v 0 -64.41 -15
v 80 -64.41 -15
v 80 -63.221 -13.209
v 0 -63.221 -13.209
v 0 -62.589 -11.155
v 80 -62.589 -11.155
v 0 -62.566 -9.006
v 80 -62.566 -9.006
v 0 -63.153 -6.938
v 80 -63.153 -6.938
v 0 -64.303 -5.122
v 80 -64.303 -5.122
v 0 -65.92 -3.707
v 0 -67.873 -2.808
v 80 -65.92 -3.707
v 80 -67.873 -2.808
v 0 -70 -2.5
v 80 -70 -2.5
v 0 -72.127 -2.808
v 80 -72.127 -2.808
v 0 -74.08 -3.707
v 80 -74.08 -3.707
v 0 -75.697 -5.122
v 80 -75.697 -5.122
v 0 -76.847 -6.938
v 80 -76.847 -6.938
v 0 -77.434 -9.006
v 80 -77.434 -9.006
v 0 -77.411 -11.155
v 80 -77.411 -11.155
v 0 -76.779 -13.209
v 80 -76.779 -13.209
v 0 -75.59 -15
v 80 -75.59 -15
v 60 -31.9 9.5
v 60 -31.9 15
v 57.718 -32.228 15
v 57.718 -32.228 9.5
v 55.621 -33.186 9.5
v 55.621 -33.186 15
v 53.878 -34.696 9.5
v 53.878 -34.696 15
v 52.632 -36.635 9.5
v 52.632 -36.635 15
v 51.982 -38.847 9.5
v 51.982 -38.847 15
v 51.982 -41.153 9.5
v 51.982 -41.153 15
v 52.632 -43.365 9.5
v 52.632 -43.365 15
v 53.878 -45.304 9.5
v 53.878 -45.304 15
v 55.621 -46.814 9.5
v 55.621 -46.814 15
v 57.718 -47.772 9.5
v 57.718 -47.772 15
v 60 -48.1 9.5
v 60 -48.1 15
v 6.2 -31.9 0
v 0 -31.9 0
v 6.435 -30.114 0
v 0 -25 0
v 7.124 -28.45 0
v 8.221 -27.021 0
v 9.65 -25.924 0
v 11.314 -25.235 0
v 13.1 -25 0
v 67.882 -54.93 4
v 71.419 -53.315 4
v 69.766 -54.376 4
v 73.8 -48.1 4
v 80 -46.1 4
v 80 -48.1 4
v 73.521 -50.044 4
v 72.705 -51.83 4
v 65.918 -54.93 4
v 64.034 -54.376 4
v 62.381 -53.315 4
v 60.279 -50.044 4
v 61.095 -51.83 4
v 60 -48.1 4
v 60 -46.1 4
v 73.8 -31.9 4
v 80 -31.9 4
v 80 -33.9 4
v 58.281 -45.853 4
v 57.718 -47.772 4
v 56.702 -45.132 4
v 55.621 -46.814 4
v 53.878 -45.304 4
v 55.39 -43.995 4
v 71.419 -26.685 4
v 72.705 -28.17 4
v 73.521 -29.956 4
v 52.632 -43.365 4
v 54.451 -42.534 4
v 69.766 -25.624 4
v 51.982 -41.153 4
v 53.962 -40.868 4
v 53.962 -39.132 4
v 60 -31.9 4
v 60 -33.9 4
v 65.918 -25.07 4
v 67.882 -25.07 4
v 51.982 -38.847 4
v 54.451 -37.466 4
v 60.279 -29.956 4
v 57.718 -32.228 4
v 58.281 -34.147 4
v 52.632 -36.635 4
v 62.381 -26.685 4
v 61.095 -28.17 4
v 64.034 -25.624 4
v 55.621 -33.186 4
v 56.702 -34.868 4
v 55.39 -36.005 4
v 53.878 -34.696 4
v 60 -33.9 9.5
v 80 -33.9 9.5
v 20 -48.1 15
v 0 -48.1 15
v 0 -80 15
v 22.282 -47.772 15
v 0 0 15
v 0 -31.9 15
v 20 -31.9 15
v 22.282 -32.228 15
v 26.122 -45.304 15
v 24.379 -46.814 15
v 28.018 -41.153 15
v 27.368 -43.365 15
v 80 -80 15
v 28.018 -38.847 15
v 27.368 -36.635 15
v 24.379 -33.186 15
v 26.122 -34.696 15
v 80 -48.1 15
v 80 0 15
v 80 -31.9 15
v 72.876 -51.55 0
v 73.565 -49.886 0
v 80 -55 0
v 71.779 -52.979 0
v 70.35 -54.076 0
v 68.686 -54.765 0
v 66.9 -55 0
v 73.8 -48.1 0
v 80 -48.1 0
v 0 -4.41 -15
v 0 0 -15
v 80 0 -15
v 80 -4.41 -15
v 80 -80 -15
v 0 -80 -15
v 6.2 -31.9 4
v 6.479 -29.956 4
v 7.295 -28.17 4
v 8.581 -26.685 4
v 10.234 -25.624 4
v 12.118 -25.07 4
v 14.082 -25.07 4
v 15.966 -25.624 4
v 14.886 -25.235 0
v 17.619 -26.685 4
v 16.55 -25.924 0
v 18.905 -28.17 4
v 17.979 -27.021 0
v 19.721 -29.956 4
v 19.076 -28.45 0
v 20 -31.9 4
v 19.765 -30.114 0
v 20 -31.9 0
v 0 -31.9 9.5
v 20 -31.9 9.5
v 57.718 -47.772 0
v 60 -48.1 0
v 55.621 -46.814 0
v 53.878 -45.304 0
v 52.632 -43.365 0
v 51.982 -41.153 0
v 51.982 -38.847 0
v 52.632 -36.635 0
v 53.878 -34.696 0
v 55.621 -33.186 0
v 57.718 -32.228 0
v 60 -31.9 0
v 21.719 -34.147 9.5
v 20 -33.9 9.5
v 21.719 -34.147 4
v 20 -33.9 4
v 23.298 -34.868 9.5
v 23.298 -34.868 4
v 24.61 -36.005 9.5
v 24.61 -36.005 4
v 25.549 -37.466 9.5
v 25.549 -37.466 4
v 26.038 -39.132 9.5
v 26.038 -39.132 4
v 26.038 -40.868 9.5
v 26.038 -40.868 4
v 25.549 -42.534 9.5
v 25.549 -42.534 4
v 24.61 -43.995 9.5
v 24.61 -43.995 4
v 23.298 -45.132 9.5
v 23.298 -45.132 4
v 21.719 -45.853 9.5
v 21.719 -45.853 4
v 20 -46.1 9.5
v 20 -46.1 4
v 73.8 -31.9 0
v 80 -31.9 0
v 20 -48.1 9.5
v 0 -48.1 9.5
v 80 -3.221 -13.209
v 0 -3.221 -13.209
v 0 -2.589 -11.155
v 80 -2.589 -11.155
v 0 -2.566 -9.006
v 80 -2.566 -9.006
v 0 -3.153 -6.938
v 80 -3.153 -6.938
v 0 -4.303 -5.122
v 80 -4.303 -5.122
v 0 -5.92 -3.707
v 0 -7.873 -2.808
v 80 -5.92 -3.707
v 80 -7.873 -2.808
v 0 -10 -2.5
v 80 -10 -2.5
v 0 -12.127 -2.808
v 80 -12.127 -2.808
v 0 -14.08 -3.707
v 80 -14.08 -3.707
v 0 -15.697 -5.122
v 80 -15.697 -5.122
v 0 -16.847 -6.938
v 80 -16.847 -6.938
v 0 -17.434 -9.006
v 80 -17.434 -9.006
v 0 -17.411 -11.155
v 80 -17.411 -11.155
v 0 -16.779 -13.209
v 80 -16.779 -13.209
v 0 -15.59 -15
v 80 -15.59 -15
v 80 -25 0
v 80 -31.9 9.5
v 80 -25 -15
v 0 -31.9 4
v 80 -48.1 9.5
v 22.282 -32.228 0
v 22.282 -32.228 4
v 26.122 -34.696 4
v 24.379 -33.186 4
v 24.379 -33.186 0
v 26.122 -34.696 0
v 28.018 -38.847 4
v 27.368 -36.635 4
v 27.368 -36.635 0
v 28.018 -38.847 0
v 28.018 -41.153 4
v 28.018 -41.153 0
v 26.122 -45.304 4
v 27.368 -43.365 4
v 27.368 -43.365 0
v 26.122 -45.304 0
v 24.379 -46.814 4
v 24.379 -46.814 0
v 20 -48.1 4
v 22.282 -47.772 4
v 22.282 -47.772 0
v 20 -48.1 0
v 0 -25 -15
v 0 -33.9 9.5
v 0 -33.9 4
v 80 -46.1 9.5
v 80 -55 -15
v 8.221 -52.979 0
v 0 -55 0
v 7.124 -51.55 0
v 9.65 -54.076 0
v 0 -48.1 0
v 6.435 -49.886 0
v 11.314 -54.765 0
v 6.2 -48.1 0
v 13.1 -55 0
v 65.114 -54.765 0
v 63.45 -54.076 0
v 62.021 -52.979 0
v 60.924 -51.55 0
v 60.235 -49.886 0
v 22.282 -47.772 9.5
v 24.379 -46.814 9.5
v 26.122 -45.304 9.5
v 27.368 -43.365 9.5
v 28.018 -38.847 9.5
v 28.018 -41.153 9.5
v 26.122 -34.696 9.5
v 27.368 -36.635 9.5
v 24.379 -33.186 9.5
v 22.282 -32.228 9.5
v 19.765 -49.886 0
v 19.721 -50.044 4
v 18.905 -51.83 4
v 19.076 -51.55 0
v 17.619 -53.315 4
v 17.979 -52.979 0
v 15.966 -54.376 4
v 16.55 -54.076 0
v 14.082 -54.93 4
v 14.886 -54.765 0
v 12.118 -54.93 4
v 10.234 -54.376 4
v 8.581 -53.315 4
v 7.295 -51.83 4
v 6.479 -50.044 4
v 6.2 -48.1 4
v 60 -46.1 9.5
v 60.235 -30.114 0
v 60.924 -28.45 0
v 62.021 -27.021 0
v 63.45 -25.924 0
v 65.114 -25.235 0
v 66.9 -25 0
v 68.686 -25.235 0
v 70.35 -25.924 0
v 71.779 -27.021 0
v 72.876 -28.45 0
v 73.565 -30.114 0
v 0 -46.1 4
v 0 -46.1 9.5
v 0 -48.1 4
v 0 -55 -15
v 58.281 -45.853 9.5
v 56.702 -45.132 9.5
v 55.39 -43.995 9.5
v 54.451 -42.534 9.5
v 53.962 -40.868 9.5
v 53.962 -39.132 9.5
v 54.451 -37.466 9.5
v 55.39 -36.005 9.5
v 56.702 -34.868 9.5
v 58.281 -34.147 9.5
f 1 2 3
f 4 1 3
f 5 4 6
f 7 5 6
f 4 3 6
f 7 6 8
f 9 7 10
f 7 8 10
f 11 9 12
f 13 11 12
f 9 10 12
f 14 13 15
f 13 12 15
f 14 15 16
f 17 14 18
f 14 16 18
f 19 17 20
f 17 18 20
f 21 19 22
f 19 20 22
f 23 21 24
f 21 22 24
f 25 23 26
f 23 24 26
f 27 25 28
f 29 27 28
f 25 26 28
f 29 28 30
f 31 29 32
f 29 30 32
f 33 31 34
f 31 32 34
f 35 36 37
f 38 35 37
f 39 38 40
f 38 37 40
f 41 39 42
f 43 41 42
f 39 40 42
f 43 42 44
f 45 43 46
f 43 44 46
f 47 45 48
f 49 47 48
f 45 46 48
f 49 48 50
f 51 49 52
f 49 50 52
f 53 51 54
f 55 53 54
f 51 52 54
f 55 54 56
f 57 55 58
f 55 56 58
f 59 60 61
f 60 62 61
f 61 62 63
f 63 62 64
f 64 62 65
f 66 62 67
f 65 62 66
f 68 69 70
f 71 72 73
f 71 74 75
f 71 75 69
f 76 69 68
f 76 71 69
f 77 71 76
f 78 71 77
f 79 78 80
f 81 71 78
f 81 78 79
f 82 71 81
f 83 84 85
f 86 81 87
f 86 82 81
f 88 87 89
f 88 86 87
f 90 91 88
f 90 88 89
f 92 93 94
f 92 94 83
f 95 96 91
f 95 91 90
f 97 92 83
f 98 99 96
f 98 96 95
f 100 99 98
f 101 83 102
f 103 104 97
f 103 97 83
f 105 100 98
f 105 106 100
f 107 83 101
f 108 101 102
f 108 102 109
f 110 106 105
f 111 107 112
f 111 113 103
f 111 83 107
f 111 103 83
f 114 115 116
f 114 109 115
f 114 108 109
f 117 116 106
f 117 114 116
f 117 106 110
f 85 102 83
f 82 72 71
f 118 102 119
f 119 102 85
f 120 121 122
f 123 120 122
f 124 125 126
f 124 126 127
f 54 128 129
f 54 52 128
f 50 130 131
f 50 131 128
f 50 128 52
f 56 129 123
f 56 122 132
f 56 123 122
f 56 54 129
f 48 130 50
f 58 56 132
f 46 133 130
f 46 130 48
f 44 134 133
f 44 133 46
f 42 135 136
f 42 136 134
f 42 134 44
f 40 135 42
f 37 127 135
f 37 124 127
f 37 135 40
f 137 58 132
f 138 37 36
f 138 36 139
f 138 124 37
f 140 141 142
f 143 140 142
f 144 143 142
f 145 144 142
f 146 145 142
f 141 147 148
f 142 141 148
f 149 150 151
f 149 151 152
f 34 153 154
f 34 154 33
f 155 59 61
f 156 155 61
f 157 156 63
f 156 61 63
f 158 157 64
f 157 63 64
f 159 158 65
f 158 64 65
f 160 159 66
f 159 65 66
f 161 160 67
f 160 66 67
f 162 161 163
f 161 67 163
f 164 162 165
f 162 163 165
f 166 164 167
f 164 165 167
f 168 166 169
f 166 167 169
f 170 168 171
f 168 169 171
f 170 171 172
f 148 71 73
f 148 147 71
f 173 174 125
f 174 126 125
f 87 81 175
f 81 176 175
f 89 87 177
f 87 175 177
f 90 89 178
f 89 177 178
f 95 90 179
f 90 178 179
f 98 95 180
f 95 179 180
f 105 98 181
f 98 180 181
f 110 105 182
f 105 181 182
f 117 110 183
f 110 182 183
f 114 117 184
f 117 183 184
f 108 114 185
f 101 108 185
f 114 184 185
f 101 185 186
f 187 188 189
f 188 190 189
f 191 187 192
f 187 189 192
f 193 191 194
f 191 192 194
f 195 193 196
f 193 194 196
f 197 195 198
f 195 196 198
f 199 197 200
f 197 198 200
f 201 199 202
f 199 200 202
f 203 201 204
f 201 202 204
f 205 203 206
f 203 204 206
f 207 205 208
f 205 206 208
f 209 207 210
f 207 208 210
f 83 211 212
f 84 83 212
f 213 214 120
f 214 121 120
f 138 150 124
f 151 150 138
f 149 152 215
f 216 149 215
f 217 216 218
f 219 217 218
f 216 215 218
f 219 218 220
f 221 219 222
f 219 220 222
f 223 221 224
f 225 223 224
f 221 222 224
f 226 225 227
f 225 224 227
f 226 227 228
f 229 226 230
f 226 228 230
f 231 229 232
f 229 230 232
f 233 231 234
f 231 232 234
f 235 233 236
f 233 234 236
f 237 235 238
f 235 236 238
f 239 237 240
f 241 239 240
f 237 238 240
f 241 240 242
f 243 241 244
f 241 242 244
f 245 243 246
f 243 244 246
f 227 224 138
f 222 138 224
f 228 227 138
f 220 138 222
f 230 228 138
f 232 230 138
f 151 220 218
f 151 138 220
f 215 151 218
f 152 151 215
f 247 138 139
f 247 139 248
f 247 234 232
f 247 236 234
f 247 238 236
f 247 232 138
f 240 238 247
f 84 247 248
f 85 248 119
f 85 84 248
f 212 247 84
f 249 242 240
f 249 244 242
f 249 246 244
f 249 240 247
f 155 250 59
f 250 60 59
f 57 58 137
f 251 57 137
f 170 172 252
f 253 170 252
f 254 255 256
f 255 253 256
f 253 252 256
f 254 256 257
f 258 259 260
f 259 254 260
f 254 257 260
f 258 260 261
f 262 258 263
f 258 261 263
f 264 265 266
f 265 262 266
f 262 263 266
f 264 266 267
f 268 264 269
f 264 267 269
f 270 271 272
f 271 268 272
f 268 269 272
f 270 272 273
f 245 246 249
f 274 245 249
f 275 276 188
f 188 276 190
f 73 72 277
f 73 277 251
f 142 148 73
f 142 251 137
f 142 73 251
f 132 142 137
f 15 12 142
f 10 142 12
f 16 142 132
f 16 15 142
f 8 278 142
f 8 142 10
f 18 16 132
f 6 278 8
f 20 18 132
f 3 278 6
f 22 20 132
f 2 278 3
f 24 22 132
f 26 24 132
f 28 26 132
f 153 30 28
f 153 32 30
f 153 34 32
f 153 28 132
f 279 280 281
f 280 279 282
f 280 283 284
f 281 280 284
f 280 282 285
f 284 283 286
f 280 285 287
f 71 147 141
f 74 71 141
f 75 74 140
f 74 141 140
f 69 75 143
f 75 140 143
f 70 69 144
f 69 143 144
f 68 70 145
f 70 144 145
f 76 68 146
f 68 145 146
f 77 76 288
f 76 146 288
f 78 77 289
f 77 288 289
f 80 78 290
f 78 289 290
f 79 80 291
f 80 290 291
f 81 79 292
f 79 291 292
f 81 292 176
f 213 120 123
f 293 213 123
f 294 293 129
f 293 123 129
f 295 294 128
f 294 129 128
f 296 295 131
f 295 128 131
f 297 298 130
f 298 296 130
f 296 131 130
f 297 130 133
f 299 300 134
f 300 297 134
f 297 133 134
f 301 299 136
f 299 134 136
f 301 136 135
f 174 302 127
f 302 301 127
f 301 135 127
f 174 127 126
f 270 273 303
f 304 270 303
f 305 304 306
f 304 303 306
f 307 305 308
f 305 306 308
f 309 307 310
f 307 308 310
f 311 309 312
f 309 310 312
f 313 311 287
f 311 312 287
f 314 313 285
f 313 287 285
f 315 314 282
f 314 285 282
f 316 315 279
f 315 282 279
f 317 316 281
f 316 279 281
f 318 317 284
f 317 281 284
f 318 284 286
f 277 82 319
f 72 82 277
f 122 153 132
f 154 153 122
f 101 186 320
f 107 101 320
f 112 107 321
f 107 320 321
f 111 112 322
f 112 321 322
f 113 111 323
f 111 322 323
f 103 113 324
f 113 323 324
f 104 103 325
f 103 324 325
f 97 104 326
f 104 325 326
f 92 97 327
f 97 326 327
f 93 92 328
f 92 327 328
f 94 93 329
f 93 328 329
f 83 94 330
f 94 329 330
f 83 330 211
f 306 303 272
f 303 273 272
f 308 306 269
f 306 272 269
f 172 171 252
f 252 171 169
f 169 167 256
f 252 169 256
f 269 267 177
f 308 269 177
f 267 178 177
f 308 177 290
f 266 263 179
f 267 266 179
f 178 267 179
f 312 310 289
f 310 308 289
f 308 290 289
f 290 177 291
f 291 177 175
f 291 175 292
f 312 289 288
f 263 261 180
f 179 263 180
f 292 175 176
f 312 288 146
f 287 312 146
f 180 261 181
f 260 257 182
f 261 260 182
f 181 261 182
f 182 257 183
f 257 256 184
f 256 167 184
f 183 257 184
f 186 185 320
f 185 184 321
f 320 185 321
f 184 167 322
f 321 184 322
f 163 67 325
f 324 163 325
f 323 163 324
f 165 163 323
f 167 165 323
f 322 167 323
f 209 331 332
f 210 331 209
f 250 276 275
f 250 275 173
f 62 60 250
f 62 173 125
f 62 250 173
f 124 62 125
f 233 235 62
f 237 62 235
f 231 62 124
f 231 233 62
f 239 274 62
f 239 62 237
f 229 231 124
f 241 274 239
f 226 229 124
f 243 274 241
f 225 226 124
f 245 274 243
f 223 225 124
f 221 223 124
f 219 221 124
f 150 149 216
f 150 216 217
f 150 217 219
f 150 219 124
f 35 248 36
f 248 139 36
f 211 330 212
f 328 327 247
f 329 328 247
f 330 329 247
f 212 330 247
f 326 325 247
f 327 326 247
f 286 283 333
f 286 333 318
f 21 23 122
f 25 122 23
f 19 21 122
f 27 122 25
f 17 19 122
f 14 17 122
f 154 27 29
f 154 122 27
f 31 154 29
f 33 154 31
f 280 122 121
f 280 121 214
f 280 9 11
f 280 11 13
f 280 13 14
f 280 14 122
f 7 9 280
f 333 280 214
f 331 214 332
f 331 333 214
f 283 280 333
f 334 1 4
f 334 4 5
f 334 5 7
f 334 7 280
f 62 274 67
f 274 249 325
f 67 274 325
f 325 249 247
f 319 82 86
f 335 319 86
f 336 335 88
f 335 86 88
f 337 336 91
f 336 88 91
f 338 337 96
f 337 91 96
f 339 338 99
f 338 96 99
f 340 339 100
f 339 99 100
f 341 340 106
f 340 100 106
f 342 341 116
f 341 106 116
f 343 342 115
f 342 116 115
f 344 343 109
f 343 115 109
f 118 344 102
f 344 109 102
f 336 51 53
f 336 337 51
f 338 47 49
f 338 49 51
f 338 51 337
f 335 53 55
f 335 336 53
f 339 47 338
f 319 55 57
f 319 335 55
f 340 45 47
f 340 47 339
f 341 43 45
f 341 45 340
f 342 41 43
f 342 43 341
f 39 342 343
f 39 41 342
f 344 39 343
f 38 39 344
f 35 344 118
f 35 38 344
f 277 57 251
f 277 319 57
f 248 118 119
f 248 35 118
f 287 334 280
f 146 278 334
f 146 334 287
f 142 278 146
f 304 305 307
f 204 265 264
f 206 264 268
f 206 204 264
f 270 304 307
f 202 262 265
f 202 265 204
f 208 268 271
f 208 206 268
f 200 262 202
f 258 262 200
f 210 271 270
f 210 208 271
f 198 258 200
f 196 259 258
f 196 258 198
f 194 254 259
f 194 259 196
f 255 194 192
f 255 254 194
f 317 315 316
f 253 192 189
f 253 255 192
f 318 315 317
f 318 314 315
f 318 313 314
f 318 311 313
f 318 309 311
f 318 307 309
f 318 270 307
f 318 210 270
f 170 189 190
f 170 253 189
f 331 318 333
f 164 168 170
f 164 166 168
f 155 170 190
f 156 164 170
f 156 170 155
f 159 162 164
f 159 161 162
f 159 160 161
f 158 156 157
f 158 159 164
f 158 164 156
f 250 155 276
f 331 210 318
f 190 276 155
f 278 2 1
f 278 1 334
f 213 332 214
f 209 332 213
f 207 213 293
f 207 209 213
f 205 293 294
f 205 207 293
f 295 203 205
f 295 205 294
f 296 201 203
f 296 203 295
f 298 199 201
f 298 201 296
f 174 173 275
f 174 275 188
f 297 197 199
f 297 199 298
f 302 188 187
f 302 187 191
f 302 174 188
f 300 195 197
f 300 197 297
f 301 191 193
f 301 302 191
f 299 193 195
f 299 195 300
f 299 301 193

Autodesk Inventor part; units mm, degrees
ref_plane "YZ Plane" through (0, 0, 0) normal (1, 0, 0) x (0, 1, 0)
ref_plane "XZ Plane" through (0, 0, 0) normal (0, 1, 0) x (-1, 0, 0)
ref_plane "XY Plane" through (0, 0, 0) normal (0, 0, 1) x (1, 0, 0)
sketch "Sketch1" plane through (0, 0, 0) normal (0, 0, 1) x (1, 0, 0)
  line L0 (0, 0) -> (80, 0)
  line L1 (80, 0) -> (80, -80)
  line L2 (80, -80) -> (0, -80)
  line L3 (0, -80) -> (0, 0)
  dimension "d0" = 80
  dimension "d1" = 80
extrude "Extrusion1" add sketch "Sketch1" along normal blind 15
sketch "Sketch2" plane through (0, 0, 0) normal (0, 0, -1) x (-1, 0, 0)
  line L0 (0, 0) -> (-80, 0) projected
  circle A0 centre (-60, -40) radius 6.1
  line L1 (-80, 0) -> (-80, -80) projected
  line L2 (-60, -33.9) -> (-80, -33.9)
  line L3 (-80, -80) -> (-80, 0) projected
  line L4 (-60, -46.1) -> (-80, -46.1)
  line L5 (-80, -46.1) -> (-80, -33.9)
  dimension "d7" = 40
  dimension "d8" = 20
  dimension "d9" = 12.2
extrude "Extrusion2" cut sketch "Sketch2" against normal through all
sketch "Sketch3" plane through (0, 0, 0) normal (0, 0, -1) x (-1, 0, 0)
  arc A0 (-60, -46.1) -> (-60, -33.9) centre (-60, -40) ccw projected
  circle A1 centre (-60, -40) radius 8.1
  line L0 (-60, -31.9) -> (-80, -31.9)
  line L1 (-80, -33.9) -> (-80, 0) projected
  line L2 (-60, -48.1) -> (-80, -48.1)
  line L3 (-80, -48.1) -> (-80, -31.9)
  point P0 (0, 0)
  dimension "d12" = 16.2
extrude "Extrusion3" cut sketch "Sketch3" against normal blind 4
sketch "Sketch4" plane through (0, 0, 15) normal (0, 0, 1) x (1, 0, 0)
  line L0 (80, -31.9) -> (60, -31.9) projected
  arc A0 (60, -31.9) -> (60, -48.1) centre (60, -40) ccw projected
  line L1 (60, -48.1) -> (80, -48.1) projected
  line L2 (80, -46.1) -> (60, -46.1) projected
  arc A1 (60, -33.9) -> (60, -46.1) centre (60, -40) ccw projected
  line L3 (60, -33.9) -> (80, -33.9) projected
  line L4 (80, -33.9) -> (80, -31.9)
  line L5 (80, -33.9) -> (80, 0) projected
  line L6 (80, -46.1) -> (80, -48.1)
  line L7 (80, -80) -> (80, -46.1) projected
  point P0 (0, 0)
extrude "Extrusion4" cut sketch "Sketch4" against normal blind 5.5
sketch "Sketch5" plane through (0, 0, 0) normal (0, 0, -1) x (-1, 0, 0)
  arc A0 (-60, -46.1) -> (-60, -33.9) centre (-60, -40) ccw projected
  line L0 (-80, -31.9) -> (-60, -31.9) projected
  circle A1 centre (-60, -40) radius 8.1
  line L1 (-60, -31.9) -> (-60, -31.9)
  line L2 (-73.8, -31.9) -> (-73.8, -48.1)
  line L3 (-60, -48.1) -> (-60, -48.1)
  arc A2 (-60, -48.1) -> (-60, -31.9) centre (-60, -40) ccw projected
  line L4 (-60, -31.9) -> (-60, -31.9)
  line L5 (-60, -31.9) -> (-60, -31.9)
  line L6 (-60, -33.9) -> (-60, -46.1)
  arc A3 (-60, -31.9) -> (-73.8, -31.9) centre (-66.9, -31.9) ccw
  arc A4 (-73.8, -48.1) -> (-60, -48.1) centre (-66.9, -48.1) ccw
  point P0 (0, 0)
  dimension "d17" = 13.8
  dimension "d20" = 16.2
  dimension "d21" = 8.1
  dimension "d37" = 0
extrude "Extrusion5" cut sketch "Sketch5" against normal blind 4 contours A3 L0 | L0 A1 A4 L2
sketch "Sketch6" plane through (80, 0, 15) normal (1, 0, 0) x (0, 0, -1)
  line L0 (15, 0) -> (0, 0) projected
  line L1 (15, 0) -> (30, 0)
  line L2 (30, -25) -> (15, -25)
  line L3 (15, -25) -> (15, 0)
  line L4 (15, -80) -> (0, -80) projected
  line L5 (15, -80) -> (30, -80)
  line L6 (30, -55) -> (15, -55)
  line L7 (15, -55) -> (15, -80)
  arc A0 (30, -4.4098) -> (30, -15.5902) centre (25, -10) ccw
  arc A1 (30, -64.4098) -> (30, -75.5902) centre (25, -70) ccw
  line L8 (30, 0) -> (30, -4.4098)
  line L9 (30, -15.5902) -> (30, -25)
  line L10 (30, -80) -> (30, -75.5902)
  line L11 (30, -64.4098) -> (30, -55)
  dimension "d22" = 25
  dimension "d23" = 25
  dimension "d24" = 15
  dimension "d25" = 15
  dimension "d29" = 15
  dimension "d32" = 15
  dimension "d33" = 5
  dimension "d34" = 5
  dimension "d38" = 15
  dimension "d39" = 15
  dimension "d40" = 60
  dimension "d41" = 10
  dimension "d42" = 10
extrude "Extrusion6" add sketch "Sketch6" against normal blind 80
ref_plane "Work Plane1" through (40, -33.9, 4) normal (1, 0, 0) x (0, 0, -1)
mirror "Mirror1" about plane through (40, -33.9, 4) normal (1, 0, 0) of "Extrusion5", "Extrusion4", "Extrusion3", "Extrusion2"
equation "\"d24\" = d25"
equation "\"d32\" = d29"
equation "\"d34\" = d33"
equation "\"RodDiameter\" = 8"
equation "\"VerticalBearingOD\" = 16"
equation "\"PrintingClearance\" = 0.2"
equation "\"d31\" = d30"
equation "\"d30\" = 5"
properties part number "HotendMountCarriage"
